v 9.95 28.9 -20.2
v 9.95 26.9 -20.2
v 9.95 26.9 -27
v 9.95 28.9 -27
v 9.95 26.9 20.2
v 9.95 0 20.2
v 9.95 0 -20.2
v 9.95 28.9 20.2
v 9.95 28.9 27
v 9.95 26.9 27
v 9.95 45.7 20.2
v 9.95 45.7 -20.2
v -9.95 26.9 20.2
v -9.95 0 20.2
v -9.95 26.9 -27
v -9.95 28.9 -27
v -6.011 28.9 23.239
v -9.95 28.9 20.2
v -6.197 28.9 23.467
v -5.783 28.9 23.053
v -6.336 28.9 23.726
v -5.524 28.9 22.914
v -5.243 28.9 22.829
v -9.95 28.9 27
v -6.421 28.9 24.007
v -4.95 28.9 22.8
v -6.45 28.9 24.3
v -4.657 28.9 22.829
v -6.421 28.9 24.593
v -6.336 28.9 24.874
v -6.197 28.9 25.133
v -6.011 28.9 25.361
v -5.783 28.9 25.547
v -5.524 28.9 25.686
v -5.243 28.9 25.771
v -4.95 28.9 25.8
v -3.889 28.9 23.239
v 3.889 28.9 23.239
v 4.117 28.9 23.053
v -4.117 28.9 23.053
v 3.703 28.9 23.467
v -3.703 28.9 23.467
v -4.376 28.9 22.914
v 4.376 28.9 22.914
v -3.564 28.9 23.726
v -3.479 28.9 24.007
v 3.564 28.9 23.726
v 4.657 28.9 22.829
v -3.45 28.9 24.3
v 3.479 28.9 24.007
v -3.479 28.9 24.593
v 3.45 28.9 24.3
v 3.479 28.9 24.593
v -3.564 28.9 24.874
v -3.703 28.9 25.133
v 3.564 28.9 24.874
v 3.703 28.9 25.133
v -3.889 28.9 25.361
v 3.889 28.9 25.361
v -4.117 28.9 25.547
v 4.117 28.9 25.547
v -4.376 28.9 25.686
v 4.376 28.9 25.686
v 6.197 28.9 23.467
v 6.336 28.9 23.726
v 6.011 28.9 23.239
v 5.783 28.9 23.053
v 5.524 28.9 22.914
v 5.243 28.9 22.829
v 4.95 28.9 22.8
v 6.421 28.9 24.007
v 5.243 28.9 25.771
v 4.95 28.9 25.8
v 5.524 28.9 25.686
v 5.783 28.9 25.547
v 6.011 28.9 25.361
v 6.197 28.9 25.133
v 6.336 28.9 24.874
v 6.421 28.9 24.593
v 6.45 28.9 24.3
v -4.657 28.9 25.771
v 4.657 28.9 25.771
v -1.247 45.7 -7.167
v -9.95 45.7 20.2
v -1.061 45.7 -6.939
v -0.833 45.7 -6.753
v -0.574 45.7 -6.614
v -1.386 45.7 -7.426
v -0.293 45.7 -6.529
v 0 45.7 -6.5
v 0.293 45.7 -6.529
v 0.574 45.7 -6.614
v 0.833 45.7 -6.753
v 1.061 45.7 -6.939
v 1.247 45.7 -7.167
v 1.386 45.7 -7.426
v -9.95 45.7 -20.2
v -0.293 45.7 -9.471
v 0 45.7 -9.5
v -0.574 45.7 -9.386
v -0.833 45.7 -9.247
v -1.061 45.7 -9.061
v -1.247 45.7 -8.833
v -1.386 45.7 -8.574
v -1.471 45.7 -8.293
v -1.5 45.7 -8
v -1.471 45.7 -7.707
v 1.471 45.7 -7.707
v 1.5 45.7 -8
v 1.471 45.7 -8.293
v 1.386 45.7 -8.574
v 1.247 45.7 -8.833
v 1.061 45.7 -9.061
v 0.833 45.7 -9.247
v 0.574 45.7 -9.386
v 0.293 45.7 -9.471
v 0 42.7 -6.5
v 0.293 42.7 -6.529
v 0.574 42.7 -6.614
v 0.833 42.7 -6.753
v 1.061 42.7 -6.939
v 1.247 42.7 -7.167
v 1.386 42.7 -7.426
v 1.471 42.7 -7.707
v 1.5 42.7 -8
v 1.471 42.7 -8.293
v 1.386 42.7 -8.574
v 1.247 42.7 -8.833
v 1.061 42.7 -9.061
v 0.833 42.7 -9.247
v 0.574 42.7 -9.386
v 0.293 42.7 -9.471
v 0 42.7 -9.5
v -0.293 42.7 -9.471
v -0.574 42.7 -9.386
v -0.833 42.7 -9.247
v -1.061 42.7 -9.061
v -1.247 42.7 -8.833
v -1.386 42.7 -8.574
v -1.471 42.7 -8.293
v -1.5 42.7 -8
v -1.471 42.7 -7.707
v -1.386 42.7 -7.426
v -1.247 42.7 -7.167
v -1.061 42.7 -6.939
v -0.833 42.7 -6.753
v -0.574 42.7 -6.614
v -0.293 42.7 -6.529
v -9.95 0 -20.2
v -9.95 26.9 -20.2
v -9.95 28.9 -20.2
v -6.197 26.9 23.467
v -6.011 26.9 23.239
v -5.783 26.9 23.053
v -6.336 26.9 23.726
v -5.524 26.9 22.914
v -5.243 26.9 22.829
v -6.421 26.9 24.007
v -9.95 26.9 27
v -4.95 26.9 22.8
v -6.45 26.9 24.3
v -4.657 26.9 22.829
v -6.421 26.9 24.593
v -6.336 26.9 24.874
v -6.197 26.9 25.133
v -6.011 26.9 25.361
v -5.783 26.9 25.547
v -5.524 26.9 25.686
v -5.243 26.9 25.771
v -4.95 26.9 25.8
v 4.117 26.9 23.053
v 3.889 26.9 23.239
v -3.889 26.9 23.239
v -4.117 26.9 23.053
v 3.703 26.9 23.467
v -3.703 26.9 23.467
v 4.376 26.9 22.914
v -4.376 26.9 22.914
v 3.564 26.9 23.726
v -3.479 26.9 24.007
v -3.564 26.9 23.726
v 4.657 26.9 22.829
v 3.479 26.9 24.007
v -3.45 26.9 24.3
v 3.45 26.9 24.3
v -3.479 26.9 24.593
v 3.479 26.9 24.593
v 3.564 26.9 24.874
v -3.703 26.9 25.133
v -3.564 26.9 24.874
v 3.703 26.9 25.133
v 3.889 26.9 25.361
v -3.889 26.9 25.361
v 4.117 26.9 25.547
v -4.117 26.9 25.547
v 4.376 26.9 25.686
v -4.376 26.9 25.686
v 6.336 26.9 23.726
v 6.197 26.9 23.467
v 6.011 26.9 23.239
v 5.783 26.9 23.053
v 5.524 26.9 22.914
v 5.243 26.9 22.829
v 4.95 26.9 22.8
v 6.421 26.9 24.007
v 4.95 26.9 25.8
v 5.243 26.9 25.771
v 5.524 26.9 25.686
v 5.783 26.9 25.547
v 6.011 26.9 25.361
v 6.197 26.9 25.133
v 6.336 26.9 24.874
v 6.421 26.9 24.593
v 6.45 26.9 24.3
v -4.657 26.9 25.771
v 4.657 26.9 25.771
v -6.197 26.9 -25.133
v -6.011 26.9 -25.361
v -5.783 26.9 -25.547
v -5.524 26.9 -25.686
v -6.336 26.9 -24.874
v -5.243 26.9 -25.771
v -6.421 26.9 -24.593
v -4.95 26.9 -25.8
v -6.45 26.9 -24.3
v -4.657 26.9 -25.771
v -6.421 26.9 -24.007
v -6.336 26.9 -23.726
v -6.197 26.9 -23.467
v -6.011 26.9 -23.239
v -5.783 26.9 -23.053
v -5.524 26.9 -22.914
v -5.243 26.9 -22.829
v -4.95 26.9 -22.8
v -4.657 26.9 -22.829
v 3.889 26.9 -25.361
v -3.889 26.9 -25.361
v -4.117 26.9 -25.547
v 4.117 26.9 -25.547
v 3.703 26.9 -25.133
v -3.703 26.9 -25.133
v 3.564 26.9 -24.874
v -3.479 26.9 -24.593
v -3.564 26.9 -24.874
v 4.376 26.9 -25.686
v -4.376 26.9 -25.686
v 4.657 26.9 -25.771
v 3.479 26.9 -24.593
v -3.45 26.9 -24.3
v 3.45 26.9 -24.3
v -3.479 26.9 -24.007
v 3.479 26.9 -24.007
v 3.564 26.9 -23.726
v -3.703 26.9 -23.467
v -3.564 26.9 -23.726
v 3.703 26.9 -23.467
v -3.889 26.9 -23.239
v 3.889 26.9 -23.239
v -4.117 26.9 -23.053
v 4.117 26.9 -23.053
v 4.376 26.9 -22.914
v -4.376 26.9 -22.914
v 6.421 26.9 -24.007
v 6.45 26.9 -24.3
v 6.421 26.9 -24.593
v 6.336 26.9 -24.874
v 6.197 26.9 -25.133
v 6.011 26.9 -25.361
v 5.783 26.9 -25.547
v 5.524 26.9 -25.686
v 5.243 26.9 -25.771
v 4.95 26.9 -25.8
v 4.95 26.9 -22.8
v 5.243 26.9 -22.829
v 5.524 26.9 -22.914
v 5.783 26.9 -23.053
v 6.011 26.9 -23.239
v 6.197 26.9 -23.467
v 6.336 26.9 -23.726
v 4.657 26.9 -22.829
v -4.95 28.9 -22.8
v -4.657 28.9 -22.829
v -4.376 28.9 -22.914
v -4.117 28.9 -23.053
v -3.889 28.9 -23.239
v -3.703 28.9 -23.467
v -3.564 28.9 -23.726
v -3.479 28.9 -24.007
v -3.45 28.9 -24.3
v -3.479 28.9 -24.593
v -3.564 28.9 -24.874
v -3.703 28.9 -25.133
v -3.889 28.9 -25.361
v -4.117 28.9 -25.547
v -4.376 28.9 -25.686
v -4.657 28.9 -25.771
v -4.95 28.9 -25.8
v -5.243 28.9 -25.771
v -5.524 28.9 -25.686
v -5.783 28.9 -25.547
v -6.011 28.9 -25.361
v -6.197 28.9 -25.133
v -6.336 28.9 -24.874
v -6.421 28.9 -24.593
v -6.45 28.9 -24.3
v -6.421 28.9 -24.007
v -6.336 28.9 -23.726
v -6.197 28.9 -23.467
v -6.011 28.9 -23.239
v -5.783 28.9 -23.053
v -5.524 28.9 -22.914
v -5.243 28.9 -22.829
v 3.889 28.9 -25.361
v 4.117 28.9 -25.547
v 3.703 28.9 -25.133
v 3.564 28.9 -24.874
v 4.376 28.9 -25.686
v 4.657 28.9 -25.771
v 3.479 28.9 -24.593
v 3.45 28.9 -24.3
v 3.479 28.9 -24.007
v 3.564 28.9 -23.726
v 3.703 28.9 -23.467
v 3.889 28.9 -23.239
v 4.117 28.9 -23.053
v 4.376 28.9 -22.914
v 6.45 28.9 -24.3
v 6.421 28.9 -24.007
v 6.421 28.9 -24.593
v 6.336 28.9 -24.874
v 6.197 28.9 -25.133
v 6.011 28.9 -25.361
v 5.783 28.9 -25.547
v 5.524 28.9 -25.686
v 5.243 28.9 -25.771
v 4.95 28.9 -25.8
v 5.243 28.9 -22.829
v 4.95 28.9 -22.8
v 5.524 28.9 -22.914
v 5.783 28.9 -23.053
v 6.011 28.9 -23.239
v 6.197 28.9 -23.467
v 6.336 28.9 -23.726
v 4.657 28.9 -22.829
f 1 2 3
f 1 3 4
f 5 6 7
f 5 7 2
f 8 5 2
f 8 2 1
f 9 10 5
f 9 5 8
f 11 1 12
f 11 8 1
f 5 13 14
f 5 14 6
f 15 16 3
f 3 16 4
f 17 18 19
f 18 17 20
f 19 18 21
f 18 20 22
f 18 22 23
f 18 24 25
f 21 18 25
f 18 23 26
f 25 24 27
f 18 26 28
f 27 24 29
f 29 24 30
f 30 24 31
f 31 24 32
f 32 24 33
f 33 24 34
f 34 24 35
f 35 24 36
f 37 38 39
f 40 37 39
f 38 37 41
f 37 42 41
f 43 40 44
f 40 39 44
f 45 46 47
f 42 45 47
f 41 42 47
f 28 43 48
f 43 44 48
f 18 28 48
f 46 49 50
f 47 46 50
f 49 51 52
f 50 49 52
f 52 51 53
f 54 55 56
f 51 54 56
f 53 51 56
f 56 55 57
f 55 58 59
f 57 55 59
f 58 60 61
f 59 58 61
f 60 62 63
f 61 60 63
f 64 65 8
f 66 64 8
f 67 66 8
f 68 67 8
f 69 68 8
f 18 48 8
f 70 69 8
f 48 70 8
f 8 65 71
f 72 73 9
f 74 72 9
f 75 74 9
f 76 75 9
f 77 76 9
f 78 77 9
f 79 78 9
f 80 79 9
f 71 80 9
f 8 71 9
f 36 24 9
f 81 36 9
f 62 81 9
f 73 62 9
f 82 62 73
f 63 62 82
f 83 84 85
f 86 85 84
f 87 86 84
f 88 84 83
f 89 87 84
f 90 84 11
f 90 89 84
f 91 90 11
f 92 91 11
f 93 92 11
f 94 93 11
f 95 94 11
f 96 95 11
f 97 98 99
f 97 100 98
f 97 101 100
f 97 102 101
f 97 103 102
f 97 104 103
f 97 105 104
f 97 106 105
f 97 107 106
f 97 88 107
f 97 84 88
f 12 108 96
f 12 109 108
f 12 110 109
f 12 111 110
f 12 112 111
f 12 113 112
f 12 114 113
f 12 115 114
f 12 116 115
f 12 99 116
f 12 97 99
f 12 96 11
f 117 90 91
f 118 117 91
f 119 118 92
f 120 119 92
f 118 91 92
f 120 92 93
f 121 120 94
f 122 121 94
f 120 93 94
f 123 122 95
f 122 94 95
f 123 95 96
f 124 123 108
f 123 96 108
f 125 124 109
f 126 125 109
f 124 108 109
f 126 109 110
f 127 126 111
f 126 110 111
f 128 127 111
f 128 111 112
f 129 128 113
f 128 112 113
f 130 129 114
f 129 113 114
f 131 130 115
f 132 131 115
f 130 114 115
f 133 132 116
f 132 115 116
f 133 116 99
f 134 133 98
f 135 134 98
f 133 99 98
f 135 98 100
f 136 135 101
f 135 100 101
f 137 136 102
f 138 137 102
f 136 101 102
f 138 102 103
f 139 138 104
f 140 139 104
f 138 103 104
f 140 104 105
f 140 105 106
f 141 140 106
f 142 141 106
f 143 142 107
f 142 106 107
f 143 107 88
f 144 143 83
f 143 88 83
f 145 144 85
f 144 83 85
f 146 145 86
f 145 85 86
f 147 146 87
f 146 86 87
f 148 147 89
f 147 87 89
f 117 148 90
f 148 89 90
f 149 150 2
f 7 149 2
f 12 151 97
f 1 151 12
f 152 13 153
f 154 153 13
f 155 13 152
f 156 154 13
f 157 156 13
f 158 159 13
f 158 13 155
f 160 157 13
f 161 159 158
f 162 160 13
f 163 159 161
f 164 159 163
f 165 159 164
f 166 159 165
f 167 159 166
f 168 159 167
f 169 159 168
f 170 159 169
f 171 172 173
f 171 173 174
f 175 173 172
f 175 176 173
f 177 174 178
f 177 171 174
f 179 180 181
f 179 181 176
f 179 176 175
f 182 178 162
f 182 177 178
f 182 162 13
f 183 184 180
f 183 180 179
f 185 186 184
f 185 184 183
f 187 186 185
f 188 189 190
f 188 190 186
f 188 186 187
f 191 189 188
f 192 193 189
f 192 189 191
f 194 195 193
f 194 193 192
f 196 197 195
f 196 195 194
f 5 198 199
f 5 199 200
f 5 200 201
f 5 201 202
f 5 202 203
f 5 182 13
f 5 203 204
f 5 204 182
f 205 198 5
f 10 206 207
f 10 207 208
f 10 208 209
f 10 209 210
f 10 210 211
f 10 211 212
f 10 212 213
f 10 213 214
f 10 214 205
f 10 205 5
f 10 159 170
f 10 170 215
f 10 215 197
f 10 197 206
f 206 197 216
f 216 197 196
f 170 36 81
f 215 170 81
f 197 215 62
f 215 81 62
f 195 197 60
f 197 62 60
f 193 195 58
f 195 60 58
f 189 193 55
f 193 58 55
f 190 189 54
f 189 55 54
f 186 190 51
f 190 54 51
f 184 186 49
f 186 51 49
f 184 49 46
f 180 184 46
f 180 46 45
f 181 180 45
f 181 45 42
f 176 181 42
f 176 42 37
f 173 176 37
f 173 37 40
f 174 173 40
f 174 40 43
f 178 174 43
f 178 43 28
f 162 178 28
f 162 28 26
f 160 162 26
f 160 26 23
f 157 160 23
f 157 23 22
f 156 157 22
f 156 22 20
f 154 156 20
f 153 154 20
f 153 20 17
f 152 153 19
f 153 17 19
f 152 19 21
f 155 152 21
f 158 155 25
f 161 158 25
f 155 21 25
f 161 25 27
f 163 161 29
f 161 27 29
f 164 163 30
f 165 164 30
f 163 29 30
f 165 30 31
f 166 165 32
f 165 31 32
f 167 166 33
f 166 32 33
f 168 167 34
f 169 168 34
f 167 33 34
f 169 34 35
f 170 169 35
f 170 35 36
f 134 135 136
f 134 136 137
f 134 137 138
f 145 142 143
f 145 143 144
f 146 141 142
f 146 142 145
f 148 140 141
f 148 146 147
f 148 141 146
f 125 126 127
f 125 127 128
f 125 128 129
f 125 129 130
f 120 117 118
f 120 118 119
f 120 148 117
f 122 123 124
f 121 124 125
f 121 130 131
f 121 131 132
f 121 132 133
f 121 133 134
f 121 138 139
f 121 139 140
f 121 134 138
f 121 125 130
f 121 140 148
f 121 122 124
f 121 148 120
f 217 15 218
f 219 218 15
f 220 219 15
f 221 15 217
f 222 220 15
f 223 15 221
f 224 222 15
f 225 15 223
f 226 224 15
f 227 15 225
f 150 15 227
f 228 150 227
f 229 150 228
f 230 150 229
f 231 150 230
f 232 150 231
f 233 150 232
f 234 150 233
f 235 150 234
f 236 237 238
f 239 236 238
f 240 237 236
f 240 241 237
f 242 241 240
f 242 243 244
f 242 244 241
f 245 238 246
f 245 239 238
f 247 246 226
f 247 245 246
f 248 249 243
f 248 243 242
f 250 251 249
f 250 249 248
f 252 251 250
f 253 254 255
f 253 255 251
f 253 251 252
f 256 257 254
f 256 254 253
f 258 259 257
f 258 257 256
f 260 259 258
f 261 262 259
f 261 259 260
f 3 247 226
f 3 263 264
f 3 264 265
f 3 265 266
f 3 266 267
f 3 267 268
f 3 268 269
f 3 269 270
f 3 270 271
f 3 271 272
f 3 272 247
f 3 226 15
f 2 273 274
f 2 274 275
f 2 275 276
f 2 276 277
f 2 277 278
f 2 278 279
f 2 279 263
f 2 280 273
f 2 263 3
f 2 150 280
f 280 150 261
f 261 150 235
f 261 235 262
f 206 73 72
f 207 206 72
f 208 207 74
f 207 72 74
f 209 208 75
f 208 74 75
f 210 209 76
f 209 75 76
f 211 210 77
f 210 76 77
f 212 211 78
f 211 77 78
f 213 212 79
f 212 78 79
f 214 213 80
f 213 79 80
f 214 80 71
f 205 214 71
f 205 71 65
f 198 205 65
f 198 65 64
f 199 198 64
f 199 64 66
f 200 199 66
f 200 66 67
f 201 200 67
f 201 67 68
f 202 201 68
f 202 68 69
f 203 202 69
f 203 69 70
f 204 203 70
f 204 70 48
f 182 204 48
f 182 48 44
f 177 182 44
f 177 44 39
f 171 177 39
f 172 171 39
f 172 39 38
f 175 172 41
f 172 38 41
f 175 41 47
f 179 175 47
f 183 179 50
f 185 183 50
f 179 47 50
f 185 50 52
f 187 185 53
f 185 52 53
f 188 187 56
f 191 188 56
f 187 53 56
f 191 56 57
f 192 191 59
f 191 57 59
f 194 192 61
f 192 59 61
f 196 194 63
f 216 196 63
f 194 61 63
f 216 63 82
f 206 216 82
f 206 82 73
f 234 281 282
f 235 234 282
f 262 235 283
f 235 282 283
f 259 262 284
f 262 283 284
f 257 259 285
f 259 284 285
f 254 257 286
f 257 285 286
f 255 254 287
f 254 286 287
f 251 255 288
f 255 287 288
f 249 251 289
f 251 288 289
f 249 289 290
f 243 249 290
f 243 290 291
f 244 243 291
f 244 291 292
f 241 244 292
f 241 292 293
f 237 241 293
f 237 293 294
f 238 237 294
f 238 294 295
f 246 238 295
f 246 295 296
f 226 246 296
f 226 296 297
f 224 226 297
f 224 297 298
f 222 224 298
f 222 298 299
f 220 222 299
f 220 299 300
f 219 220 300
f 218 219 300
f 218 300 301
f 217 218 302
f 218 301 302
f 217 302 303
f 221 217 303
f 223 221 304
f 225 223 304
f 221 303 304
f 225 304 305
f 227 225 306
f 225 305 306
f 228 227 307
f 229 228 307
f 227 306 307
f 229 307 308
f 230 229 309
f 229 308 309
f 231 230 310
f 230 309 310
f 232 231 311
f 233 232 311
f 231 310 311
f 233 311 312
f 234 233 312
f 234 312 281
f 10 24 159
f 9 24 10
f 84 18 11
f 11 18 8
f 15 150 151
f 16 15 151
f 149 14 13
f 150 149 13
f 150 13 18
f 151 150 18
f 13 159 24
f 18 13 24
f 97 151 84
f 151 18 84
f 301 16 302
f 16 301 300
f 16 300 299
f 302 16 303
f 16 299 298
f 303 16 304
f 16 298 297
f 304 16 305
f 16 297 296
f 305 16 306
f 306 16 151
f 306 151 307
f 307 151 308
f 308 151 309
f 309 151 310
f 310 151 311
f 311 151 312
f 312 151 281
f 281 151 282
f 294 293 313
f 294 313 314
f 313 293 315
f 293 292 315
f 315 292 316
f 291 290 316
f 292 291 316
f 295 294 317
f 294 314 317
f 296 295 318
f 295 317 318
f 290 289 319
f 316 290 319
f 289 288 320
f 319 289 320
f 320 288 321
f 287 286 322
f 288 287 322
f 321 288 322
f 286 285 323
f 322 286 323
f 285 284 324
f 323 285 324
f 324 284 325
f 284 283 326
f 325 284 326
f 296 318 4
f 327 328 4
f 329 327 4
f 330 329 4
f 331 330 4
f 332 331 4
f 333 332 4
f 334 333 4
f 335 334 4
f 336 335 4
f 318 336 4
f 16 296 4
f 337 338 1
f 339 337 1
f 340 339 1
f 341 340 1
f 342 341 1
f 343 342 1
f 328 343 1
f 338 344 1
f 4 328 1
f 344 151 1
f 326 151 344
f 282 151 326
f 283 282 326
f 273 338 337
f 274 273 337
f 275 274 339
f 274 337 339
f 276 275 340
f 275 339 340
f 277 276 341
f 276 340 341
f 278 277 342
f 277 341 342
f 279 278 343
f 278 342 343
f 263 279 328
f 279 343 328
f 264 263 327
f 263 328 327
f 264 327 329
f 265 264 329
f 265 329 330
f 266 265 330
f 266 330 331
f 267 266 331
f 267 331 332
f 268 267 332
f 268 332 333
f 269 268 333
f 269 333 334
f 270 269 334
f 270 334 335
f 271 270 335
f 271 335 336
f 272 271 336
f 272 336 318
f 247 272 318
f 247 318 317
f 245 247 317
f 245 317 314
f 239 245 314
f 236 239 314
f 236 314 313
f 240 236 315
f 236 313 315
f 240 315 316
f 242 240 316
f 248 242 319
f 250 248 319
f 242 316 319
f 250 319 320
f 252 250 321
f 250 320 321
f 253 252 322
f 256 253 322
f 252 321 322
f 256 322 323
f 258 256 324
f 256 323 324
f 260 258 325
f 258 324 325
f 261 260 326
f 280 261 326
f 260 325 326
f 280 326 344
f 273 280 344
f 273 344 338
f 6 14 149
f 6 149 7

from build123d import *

# Parameters (mm, degrees)
SKETCH_1_W          = 19.9
SKETCH_1_H          = 40.4
EXTRUDE_1_DEPTH     = 45.7
SKETCH_2_W          = 19.9
SKETCH_2_H          = 2
EXTRUDE_2_DEPTH     = 27
SKETCH_3_R          = 1.5
CUT_EXTRUDE_1_DEPTH = 3
SKETCH_5_R          = 1.5
CUT_EXTRUDE_2_DEPTH = 41.782502375


with BuildPart() as part:
    # 草图1 → 凸台-拉伸1 (new body)
    with BuildSketch(Plane(origin=(0, 0, 0), x_dir=(1, 0, 0), z_dir=(0, 1, 0))):
        Rectangle(SKETCH_1_W, SKETCH_1_H)
    extrude(amount=EXTRUDE_1_DEPTH)

    # 草图2 → 凸台-拉伸2 (add, symmetric)
    with BuildSketch(Plane.XY):
        with Locations((0, 27.9)):
            Rectangle(SKETCH_2_W, SKETCH_2_H)
    extrude(amount=EXTRUDE_2_DEPTH, both=True)

    # 草图3 → 切除-拉伸1 (cut)
    with BuildSketch(Plane(origin=(0, 45.7, 0), x_dir=(1, 0, 0), z_dir=(0, 1, 0))):
        with Locations(Location((0, 8, 0), (0, 0, 270))):
            Circle(SKETCH_3_R)
    extrude(amount=-CUT_EXTRUDE_1_DEPTH, mode=Mode.SUBTRACT)

    # 草图5 → 切除-拉伸2 (cut, through all)
    with BuildSketch(Plane(origin=(0, 28.9, 0), x_dir=(1, 0, 0), z_dir=(0, 1, 0))):
        with Locations(Location((-4.95, 24.3, 0), (0, 0, 270))):
            Circle(SKETCH_5_R)
        with Locations(Location((4.95, 24.3, 0), (0, 0, 270))):
            Circle(SKETCH_5_R)
        with Locations(Location((-4.95, -24.3, 0), (0, 0, 270))):
            Circle(SKETCH_5_R)
        with Locations(Location((4.95, -24.3, 0), (0, 0, 270))):
            Circle(SKETCH_5_R)
    extrude(amount=-CUT_EXTRUDE_2_DEPTH, mode=Mode.SUBTRACT)


solid = part.part
